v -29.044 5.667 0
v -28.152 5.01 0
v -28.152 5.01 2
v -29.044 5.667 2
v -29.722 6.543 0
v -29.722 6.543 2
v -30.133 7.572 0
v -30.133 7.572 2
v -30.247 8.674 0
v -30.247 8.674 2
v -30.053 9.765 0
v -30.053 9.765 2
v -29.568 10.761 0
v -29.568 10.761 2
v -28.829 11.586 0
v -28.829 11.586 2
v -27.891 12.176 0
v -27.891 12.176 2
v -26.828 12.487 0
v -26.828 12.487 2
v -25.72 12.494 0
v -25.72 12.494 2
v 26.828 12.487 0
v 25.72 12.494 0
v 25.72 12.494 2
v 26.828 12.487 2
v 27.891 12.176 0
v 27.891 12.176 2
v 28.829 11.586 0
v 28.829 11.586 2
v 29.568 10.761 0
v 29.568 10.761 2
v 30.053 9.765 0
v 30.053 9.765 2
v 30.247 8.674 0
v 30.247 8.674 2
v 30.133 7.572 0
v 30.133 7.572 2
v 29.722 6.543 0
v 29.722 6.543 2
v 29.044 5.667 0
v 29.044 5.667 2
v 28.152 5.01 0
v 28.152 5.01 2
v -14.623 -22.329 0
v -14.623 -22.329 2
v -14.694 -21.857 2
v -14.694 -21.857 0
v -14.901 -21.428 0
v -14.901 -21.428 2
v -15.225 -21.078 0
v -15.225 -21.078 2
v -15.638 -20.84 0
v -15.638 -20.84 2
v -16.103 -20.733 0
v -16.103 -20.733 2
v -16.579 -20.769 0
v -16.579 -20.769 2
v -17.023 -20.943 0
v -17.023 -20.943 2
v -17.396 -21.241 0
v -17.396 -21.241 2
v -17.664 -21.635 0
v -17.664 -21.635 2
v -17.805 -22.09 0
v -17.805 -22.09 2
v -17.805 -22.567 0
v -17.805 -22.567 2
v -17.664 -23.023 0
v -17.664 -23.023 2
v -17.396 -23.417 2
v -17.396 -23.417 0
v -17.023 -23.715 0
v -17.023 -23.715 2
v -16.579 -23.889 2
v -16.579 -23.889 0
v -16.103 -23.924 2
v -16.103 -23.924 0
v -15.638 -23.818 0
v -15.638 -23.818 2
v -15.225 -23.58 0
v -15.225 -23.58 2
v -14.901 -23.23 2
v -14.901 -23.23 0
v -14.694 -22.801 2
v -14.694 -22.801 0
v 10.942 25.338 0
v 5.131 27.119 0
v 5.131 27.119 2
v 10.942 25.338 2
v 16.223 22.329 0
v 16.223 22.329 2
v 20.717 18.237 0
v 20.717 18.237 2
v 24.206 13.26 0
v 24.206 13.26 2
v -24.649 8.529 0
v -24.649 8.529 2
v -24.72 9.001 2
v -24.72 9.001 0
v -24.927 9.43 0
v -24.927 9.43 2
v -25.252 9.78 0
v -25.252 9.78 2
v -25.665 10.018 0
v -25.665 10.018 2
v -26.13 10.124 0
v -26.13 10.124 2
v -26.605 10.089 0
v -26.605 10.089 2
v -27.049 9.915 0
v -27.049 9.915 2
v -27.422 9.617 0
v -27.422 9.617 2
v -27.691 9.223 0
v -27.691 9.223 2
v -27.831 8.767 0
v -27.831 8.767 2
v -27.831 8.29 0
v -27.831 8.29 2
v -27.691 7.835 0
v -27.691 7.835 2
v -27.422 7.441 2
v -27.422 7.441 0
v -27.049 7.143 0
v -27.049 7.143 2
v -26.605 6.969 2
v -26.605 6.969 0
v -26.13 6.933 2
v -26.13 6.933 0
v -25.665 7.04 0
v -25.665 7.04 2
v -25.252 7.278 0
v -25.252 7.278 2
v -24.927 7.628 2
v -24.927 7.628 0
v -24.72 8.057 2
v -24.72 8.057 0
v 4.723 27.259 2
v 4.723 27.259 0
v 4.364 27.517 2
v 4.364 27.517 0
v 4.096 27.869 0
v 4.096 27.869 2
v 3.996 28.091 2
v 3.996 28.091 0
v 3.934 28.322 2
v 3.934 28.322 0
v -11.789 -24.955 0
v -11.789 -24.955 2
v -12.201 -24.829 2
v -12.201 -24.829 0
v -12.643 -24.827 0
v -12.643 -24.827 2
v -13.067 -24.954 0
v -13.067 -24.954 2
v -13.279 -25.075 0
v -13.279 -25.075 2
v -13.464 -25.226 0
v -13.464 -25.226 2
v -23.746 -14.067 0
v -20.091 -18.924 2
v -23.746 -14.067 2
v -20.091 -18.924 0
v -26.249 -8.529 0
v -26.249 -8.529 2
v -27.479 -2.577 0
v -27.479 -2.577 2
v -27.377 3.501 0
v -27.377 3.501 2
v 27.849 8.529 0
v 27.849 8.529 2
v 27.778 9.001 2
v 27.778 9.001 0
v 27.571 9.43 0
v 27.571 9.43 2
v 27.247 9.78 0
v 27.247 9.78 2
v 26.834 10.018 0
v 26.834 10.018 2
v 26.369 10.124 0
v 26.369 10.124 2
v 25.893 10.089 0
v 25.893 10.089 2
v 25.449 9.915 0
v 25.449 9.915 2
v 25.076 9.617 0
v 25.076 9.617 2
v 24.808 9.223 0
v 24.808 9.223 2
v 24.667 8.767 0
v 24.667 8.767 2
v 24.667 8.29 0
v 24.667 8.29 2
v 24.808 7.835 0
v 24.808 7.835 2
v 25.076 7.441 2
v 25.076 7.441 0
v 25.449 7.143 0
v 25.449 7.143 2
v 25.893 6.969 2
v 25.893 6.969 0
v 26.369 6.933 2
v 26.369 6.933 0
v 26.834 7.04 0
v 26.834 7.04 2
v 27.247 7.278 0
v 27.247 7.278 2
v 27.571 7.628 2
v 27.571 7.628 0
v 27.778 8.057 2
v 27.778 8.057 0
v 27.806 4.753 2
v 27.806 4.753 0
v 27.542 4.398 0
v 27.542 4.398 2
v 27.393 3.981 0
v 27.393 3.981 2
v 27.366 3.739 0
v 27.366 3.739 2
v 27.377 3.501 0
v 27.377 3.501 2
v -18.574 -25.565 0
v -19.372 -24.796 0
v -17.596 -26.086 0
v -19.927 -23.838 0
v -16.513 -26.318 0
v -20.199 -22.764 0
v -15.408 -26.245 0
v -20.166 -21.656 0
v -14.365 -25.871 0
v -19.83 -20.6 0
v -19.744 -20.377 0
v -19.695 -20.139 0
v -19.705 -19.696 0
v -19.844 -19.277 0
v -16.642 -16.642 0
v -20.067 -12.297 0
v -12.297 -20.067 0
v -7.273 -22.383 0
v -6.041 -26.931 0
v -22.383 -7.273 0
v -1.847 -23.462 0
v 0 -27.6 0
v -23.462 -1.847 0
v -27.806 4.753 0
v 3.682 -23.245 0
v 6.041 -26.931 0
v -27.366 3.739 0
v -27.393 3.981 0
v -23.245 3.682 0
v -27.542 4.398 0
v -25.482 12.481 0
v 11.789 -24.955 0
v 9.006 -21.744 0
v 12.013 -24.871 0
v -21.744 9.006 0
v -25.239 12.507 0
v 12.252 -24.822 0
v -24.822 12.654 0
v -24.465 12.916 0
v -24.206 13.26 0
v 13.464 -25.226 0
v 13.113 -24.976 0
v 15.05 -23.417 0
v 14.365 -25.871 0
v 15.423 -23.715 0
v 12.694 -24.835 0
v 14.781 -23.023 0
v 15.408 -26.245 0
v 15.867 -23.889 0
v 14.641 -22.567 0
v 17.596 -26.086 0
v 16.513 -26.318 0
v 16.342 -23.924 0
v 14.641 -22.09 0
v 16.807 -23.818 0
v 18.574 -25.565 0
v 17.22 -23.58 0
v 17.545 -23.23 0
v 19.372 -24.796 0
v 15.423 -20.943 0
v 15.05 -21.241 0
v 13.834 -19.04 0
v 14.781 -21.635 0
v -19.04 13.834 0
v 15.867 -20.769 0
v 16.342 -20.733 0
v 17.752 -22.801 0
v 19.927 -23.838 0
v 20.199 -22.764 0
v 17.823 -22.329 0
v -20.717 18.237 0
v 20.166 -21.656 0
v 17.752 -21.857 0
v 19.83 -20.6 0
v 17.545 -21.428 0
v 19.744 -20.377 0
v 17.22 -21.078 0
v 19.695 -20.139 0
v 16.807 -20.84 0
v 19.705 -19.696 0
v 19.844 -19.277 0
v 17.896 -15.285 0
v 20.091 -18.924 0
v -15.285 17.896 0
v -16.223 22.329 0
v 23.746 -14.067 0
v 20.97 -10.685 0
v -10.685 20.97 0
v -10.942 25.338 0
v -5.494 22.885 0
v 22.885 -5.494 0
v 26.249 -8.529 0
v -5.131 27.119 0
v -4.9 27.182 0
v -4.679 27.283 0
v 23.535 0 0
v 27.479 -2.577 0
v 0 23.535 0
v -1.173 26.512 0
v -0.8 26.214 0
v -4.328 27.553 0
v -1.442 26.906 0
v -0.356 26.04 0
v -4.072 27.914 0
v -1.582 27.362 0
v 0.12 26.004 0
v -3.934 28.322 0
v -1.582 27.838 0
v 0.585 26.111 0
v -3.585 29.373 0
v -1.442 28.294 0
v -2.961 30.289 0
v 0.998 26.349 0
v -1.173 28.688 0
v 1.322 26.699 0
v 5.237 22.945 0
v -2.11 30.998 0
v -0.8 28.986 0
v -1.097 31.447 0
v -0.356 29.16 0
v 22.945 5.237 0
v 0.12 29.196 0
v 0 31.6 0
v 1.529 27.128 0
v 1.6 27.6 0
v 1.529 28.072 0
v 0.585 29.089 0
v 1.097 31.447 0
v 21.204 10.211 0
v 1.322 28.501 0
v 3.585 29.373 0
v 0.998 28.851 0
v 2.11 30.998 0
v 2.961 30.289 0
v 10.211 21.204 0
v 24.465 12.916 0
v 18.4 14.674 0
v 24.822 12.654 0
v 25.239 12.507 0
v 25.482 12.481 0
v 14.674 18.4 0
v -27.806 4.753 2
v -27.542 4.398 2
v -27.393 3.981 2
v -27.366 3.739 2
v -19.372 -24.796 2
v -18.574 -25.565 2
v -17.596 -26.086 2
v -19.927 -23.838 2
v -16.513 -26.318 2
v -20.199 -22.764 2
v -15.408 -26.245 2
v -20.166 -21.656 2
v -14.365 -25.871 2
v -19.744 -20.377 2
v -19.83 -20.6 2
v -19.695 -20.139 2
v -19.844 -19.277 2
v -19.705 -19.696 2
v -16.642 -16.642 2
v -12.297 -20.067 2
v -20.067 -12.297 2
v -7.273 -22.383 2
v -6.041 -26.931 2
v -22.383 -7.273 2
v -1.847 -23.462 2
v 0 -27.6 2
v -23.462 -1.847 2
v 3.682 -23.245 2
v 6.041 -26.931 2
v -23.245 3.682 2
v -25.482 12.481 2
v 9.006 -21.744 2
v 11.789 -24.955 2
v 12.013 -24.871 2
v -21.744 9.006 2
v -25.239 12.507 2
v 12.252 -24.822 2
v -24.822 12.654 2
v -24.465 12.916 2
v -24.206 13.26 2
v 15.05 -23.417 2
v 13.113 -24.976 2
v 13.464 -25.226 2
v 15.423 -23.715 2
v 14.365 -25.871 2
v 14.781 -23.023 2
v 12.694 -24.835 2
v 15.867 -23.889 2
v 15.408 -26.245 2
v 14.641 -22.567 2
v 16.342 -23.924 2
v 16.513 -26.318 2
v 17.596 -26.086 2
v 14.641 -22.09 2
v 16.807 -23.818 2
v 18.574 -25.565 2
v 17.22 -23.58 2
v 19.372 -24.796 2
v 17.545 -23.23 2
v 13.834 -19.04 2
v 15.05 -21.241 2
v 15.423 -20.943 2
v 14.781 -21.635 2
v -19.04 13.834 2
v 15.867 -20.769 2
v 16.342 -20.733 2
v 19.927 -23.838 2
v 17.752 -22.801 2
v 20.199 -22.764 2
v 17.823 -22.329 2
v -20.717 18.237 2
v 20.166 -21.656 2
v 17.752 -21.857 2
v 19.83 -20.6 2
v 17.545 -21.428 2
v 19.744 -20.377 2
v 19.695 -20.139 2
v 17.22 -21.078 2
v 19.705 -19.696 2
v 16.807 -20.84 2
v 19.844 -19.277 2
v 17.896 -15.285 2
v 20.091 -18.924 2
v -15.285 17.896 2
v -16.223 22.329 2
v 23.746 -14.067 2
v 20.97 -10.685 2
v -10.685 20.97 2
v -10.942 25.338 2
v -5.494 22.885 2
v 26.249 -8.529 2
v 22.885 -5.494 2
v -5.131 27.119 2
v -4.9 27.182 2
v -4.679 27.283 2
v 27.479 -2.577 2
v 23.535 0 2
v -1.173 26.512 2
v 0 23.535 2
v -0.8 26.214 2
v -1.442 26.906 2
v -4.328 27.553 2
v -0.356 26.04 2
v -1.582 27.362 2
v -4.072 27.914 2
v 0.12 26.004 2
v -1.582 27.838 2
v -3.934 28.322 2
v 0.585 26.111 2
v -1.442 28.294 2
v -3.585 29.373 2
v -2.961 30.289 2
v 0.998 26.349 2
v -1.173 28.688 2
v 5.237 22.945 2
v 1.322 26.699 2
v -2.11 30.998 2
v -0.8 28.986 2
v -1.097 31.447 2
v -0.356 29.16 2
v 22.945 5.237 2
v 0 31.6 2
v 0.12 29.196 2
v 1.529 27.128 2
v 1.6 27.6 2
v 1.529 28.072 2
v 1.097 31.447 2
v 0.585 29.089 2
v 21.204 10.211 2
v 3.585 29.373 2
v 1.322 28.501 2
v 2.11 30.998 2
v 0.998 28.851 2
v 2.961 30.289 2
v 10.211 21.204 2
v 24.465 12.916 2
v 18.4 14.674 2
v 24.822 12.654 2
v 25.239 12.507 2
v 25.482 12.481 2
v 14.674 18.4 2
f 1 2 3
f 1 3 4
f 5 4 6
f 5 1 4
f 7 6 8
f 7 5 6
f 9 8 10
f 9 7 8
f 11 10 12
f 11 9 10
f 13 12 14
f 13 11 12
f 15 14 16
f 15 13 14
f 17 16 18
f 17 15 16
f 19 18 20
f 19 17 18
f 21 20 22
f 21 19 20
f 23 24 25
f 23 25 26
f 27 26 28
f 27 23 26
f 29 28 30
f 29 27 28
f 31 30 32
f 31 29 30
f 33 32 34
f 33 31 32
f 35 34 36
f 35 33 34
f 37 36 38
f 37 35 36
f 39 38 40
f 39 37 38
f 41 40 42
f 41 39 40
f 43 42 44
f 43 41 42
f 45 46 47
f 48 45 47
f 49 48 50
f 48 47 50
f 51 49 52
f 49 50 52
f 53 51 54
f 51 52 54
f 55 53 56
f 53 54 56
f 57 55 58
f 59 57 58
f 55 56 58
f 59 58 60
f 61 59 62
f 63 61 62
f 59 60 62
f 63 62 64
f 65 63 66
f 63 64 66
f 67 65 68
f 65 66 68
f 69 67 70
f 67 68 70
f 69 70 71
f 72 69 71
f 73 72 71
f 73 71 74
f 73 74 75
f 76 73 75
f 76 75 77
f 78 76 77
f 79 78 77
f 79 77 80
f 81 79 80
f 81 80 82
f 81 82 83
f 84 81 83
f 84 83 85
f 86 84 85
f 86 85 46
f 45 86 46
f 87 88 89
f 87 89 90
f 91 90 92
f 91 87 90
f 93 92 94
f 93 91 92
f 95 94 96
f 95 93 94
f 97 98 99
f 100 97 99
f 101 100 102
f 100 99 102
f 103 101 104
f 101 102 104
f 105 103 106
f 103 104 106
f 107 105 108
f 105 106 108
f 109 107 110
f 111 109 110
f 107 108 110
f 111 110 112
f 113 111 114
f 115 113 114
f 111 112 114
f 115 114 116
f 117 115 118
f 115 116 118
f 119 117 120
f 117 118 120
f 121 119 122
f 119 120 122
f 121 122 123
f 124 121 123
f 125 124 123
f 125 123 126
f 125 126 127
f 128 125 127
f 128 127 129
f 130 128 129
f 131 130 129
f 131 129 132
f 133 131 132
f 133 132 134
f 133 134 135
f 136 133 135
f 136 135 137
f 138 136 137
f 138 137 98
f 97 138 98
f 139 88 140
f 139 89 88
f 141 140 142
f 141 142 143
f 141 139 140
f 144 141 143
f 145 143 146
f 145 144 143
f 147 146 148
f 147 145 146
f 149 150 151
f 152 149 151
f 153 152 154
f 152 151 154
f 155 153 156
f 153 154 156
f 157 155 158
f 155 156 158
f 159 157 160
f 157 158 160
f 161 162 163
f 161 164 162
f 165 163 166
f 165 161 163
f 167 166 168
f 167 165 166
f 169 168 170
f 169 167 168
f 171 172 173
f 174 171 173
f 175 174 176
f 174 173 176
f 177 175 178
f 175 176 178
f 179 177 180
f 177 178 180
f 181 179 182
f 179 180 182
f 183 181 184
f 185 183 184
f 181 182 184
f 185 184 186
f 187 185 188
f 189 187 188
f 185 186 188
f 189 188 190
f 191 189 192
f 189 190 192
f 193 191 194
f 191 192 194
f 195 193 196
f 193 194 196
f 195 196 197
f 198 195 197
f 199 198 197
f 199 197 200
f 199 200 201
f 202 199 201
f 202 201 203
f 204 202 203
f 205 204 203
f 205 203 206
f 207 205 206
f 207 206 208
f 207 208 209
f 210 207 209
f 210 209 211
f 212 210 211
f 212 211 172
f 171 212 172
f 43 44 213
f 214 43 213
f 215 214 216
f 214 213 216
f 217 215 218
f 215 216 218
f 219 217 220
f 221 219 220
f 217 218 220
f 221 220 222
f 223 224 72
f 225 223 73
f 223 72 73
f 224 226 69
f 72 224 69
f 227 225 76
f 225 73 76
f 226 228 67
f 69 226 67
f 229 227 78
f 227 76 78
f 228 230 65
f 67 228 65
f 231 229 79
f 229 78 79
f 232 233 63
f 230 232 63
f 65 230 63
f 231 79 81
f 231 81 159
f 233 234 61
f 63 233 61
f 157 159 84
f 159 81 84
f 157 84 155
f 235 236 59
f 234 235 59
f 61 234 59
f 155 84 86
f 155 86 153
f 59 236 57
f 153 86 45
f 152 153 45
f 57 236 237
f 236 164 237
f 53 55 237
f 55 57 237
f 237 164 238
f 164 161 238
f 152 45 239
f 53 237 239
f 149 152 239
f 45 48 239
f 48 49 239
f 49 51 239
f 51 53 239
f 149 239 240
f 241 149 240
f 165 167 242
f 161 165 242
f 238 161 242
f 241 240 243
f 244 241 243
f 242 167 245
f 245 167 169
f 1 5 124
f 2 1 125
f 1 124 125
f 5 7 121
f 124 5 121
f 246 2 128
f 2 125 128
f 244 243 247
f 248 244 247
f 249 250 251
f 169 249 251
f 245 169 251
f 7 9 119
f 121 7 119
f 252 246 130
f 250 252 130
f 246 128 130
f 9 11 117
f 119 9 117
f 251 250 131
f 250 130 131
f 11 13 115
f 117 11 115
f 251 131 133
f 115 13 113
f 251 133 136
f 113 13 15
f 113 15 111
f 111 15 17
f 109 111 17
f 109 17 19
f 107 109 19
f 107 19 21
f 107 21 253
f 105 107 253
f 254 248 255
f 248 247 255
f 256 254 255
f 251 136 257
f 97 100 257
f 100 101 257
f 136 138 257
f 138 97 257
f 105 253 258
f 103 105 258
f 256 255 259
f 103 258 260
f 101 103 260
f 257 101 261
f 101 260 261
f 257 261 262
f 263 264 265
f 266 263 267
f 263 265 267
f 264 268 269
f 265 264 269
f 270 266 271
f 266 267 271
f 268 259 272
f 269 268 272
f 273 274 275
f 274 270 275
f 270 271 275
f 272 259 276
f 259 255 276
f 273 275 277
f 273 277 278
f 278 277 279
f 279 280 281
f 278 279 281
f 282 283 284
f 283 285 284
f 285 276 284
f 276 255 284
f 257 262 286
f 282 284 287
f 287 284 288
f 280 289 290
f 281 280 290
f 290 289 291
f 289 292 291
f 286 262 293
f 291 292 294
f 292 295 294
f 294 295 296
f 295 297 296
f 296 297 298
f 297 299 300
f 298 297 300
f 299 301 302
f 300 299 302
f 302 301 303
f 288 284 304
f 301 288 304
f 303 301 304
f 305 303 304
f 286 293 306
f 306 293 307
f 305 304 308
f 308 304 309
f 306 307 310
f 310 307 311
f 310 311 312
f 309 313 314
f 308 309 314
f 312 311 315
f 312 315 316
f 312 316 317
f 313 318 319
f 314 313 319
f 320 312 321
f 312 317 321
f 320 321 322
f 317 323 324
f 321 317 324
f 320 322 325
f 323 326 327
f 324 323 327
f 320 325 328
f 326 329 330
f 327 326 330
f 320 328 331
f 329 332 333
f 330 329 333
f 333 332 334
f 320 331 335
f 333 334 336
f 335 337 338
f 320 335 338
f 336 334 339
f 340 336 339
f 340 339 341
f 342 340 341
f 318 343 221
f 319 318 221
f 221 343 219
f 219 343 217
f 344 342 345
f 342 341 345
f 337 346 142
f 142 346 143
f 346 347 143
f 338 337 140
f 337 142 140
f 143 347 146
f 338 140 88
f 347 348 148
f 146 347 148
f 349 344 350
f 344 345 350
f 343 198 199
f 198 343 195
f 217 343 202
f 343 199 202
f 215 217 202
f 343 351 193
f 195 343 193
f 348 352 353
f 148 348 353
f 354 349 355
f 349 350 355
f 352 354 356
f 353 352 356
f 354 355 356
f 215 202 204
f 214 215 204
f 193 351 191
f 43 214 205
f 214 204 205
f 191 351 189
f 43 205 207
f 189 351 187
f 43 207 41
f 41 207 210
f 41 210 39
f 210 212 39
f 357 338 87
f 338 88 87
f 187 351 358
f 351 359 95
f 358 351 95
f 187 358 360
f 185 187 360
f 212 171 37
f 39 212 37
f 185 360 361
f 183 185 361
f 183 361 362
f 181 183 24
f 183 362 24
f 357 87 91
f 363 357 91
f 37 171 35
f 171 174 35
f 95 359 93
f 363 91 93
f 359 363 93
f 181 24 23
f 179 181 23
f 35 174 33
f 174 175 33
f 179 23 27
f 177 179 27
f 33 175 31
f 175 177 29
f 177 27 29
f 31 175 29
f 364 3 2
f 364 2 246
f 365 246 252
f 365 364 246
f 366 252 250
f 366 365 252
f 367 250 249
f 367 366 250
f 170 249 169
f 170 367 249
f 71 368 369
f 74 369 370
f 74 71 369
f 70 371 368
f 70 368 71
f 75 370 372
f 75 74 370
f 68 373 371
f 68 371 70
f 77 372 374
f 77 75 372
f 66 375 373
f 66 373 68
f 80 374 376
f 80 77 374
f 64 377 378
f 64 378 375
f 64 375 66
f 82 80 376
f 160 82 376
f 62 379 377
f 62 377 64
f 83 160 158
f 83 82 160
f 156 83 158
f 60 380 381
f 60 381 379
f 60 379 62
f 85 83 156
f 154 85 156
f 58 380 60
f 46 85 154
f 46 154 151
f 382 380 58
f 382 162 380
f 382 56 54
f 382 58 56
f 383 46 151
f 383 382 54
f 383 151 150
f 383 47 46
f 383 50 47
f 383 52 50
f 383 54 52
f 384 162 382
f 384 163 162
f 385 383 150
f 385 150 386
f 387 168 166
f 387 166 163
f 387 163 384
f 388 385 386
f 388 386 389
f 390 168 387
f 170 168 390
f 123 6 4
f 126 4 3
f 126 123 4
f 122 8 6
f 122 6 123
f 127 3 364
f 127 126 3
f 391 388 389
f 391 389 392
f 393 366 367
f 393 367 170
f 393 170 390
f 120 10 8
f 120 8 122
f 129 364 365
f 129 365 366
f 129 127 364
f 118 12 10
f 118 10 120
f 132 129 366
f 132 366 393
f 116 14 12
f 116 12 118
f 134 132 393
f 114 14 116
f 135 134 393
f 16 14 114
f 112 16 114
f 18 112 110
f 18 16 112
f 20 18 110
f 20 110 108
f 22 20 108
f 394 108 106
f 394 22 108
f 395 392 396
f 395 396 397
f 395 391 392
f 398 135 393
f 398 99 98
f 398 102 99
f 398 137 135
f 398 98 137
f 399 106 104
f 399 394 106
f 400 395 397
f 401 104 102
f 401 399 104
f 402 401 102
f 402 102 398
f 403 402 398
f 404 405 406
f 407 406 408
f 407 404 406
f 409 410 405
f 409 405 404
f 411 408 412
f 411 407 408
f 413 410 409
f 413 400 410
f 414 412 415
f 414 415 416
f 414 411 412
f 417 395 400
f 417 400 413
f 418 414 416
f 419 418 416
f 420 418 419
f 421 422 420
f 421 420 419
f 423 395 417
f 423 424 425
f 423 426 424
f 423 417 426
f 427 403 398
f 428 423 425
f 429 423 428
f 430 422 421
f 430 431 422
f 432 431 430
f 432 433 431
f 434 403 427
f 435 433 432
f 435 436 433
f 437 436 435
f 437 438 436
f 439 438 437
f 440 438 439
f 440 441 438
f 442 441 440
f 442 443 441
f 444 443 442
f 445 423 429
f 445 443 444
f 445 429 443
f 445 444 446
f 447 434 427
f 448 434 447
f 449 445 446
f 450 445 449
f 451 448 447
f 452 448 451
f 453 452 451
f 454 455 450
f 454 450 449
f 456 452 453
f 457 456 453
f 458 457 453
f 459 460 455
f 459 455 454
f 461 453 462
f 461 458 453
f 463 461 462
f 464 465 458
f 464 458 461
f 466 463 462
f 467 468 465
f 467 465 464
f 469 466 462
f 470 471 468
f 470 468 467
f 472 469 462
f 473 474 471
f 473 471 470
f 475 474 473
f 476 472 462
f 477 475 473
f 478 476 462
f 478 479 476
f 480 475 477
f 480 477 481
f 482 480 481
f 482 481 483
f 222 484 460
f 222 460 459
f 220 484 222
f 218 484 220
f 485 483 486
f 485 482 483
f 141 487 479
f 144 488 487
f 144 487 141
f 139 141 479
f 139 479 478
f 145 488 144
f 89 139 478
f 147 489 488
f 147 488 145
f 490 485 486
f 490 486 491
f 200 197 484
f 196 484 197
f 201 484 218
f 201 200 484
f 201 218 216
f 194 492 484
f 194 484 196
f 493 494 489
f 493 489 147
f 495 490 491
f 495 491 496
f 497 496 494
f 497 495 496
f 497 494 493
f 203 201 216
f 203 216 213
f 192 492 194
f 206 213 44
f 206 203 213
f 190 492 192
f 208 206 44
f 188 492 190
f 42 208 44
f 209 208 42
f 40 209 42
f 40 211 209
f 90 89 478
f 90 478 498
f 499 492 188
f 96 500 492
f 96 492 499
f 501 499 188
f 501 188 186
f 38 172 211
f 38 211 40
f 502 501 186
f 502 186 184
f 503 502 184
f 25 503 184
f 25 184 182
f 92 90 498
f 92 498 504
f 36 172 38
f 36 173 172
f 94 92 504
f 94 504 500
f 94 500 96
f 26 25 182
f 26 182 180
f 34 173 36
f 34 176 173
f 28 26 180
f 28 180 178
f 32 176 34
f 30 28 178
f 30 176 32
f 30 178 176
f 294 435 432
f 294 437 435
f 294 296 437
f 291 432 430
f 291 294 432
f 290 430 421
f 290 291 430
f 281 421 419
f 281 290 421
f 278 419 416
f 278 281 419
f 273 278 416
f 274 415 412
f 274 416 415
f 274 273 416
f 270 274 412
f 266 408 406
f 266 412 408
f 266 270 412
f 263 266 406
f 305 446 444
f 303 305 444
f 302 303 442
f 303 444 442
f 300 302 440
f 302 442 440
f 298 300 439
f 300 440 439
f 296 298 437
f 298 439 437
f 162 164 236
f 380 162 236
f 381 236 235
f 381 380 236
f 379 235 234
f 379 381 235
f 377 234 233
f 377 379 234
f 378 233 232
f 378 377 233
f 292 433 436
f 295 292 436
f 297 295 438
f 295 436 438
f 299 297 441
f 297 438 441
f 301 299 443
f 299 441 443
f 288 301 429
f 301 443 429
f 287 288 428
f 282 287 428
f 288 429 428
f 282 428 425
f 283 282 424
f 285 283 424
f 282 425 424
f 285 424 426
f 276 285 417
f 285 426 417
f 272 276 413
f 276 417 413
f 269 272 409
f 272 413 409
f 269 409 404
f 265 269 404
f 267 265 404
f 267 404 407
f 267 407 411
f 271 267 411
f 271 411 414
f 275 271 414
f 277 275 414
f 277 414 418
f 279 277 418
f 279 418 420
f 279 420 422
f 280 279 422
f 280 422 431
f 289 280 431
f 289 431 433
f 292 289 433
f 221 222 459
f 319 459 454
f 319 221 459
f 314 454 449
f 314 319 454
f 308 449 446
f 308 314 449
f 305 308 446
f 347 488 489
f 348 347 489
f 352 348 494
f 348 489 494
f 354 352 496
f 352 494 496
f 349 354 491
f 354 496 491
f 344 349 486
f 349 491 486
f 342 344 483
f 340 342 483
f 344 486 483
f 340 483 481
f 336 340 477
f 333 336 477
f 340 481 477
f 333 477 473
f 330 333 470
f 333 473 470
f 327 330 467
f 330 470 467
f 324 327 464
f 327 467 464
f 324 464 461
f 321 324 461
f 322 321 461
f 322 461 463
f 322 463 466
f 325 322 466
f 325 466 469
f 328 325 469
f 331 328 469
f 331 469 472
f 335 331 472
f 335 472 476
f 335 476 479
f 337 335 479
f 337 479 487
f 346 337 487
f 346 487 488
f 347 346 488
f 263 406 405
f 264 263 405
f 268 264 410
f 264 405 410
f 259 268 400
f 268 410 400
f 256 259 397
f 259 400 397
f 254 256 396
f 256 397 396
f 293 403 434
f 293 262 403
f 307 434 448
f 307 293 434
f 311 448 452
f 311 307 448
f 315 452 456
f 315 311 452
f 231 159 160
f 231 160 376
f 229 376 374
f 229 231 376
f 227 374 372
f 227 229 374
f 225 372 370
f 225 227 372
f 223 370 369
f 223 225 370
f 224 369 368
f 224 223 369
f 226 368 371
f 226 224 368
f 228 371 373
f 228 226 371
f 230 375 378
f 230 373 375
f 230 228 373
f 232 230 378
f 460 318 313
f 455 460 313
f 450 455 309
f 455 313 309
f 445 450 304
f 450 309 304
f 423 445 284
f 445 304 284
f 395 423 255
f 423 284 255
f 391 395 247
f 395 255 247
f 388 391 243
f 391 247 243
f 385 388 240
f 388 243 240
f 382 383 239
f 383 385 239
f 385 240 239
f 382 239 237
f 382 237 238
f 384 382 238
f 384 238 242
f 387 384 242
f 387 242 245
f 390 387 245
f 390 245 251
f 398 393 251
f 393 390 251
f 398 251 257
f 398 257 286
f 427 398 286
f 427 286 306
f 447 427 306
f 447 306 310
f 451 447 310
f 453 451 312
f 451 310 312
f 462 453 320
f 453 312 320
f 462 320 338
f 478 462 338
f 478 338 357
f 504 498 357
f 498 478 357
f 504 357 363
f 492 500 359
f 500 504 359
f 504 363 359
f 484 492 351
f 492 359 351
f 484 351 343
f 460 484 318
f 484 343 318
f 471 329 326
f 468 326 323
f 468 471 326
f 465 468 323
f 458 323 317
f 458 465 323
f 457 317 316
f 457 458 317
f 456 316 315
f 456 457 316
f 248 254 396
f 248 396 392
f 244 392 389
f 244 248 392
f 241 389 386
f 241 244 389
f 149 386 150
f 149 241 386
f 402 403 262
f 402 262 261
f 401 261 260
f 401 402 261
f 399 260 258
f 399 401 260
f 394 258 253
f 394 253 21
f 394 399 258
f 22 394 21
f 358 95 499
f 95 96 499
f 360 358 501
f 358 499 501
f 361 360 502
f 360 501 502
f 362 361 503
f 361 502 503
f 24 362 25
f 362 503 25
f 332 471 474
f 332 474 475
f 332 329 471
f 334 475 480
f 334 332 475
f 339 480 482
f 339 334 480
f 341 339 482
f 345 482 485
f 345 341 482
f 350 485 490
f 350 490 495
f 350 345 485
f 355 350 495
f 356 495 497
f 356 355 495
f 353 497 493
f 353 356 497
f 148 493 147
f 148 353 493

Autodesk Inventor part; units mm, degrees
ref_plane "YZ Plane" through (0, 0, 0) normal (1, 0, 0) x (0, 1, 0)
ref_plane "XZ Plane" through (0, 0, 0) normal (0, 1, 0) x (-1, 0, 0)
ref_plane "XY Plane" through (0, 0, 0) normal (0, 0, 1) x (1, 0, 0)
sketch "스케치1" plane through (0, 0, 0) normal (0, 0, 1) x (1, 0, 0)
  circle A0 centre (0, 0) radius 23.535
  circle A1 centre (0, 0) radius 27.6
  line L0 (0, 0) -> (0, 27.6)
  circle A2 centre (0, 27.6) radius 4
  circle A3 centre (-26.2492, 8.5289) radius 4
  circle A4 centre (-16.2229, -22.3289) radius 4
  circle A5 centre (16.2229, -22.3289) radius 4
  circle A6 centre (26.2492, 8.5289) radius 4
  dimension "d1" = 55.2
  dimension "d0" = 47.07
  dimension "d2" = 8
  dimension "d5" = 360
extrude "돌출1" add sketch "스케치1" along normal blind 2
sketch "스케치2" plane through (0, 0, 2) normal (0, 0, 1) x (1, 0, 0)
  circle A0 centre (0, 0) radius 23.535 projected
  arc A1 (24.7407, 12.2335) -> (3.9895, 27.3101) centre (0, 0) ccw projected
  arc A2 (3.9895, 27.3101) -> (-3.9895, 27.3101) centre (0, 27.6) ccw projected
  arc A3 (-3.9895, 27.3101) -> (-24.7407, 12.2335) centre (0, 0) ccw projected
  arc A4 (-24.7407, 12.2335) -> (-27.2063, 4.6451) centre (-26.2492, 8.5289) ccw projected
  arc A5 (-27.2063, 4.6451) -> (-19.2801, -19.7494) centre (0, 0) ccw projected
  arc A6 (-19.2801, -19.7494) -> (-12.8249, -24.4393) centre (-16.2229, -22.3289) ccw projected
  arc A7 (-12.8249, -24.4393) -> (12.8249, -24.4393) centre (0, 0) ccw projected
  arc A8 (12.8249, -24.4393) -> (19.2801, -19.7494) centre (16.2229, -22.3289) ccw projected
  arc A9 (19.2801, -19.7494) -> (27.2063, 4.6451) centre (0, 0) ccw projected
  arc A10 (27.2063, 4.6451) -> (24.7407, 12.2335) centre (26.2492, 8.5289) ccw projected
  circle A11 centre (-26.2492, 8.5289) radius 1.6
  circle A12 centre (-16.2229, -22.3289) radius 1.6
  circle A13 centre (16.2229, -22.3289) radius 1.6
  circle A14 centre (26.2492, 8.5289) radius 1.6
  circle A15 centre (0, 27.6) radius 1.6
  dimension "d9" = 3.2
  dimension "d10" = 3.2
  dimension "d11" = 3.2
  dimension "d12" = 3.2
  dimension "d13" = 3.2
extrude "돌출2" cut sketch "스케치2" against normal up to surface (2 mm away) contours A11 | A12 | A13 | A14 | A15
fillet "모깎기1" radius 1.5 10 edges at (-19.2801, -19.7494, 1) (-12.8249, -24.4393, 1) (19.2801, -19.7494, 1) (12.8249, -24.4393, 1) (24.7407, 12.2335, 1) (27.2063, 4.6451, 1) (3.9895, 27.3101, 1) (-3.9895, 27.3101, 1) (-24.7407, 12.2335, 1) (-27.2063, 4.6451, 1)
properties part number "조인트4베어링관절2" material "알루미늄 6061"
